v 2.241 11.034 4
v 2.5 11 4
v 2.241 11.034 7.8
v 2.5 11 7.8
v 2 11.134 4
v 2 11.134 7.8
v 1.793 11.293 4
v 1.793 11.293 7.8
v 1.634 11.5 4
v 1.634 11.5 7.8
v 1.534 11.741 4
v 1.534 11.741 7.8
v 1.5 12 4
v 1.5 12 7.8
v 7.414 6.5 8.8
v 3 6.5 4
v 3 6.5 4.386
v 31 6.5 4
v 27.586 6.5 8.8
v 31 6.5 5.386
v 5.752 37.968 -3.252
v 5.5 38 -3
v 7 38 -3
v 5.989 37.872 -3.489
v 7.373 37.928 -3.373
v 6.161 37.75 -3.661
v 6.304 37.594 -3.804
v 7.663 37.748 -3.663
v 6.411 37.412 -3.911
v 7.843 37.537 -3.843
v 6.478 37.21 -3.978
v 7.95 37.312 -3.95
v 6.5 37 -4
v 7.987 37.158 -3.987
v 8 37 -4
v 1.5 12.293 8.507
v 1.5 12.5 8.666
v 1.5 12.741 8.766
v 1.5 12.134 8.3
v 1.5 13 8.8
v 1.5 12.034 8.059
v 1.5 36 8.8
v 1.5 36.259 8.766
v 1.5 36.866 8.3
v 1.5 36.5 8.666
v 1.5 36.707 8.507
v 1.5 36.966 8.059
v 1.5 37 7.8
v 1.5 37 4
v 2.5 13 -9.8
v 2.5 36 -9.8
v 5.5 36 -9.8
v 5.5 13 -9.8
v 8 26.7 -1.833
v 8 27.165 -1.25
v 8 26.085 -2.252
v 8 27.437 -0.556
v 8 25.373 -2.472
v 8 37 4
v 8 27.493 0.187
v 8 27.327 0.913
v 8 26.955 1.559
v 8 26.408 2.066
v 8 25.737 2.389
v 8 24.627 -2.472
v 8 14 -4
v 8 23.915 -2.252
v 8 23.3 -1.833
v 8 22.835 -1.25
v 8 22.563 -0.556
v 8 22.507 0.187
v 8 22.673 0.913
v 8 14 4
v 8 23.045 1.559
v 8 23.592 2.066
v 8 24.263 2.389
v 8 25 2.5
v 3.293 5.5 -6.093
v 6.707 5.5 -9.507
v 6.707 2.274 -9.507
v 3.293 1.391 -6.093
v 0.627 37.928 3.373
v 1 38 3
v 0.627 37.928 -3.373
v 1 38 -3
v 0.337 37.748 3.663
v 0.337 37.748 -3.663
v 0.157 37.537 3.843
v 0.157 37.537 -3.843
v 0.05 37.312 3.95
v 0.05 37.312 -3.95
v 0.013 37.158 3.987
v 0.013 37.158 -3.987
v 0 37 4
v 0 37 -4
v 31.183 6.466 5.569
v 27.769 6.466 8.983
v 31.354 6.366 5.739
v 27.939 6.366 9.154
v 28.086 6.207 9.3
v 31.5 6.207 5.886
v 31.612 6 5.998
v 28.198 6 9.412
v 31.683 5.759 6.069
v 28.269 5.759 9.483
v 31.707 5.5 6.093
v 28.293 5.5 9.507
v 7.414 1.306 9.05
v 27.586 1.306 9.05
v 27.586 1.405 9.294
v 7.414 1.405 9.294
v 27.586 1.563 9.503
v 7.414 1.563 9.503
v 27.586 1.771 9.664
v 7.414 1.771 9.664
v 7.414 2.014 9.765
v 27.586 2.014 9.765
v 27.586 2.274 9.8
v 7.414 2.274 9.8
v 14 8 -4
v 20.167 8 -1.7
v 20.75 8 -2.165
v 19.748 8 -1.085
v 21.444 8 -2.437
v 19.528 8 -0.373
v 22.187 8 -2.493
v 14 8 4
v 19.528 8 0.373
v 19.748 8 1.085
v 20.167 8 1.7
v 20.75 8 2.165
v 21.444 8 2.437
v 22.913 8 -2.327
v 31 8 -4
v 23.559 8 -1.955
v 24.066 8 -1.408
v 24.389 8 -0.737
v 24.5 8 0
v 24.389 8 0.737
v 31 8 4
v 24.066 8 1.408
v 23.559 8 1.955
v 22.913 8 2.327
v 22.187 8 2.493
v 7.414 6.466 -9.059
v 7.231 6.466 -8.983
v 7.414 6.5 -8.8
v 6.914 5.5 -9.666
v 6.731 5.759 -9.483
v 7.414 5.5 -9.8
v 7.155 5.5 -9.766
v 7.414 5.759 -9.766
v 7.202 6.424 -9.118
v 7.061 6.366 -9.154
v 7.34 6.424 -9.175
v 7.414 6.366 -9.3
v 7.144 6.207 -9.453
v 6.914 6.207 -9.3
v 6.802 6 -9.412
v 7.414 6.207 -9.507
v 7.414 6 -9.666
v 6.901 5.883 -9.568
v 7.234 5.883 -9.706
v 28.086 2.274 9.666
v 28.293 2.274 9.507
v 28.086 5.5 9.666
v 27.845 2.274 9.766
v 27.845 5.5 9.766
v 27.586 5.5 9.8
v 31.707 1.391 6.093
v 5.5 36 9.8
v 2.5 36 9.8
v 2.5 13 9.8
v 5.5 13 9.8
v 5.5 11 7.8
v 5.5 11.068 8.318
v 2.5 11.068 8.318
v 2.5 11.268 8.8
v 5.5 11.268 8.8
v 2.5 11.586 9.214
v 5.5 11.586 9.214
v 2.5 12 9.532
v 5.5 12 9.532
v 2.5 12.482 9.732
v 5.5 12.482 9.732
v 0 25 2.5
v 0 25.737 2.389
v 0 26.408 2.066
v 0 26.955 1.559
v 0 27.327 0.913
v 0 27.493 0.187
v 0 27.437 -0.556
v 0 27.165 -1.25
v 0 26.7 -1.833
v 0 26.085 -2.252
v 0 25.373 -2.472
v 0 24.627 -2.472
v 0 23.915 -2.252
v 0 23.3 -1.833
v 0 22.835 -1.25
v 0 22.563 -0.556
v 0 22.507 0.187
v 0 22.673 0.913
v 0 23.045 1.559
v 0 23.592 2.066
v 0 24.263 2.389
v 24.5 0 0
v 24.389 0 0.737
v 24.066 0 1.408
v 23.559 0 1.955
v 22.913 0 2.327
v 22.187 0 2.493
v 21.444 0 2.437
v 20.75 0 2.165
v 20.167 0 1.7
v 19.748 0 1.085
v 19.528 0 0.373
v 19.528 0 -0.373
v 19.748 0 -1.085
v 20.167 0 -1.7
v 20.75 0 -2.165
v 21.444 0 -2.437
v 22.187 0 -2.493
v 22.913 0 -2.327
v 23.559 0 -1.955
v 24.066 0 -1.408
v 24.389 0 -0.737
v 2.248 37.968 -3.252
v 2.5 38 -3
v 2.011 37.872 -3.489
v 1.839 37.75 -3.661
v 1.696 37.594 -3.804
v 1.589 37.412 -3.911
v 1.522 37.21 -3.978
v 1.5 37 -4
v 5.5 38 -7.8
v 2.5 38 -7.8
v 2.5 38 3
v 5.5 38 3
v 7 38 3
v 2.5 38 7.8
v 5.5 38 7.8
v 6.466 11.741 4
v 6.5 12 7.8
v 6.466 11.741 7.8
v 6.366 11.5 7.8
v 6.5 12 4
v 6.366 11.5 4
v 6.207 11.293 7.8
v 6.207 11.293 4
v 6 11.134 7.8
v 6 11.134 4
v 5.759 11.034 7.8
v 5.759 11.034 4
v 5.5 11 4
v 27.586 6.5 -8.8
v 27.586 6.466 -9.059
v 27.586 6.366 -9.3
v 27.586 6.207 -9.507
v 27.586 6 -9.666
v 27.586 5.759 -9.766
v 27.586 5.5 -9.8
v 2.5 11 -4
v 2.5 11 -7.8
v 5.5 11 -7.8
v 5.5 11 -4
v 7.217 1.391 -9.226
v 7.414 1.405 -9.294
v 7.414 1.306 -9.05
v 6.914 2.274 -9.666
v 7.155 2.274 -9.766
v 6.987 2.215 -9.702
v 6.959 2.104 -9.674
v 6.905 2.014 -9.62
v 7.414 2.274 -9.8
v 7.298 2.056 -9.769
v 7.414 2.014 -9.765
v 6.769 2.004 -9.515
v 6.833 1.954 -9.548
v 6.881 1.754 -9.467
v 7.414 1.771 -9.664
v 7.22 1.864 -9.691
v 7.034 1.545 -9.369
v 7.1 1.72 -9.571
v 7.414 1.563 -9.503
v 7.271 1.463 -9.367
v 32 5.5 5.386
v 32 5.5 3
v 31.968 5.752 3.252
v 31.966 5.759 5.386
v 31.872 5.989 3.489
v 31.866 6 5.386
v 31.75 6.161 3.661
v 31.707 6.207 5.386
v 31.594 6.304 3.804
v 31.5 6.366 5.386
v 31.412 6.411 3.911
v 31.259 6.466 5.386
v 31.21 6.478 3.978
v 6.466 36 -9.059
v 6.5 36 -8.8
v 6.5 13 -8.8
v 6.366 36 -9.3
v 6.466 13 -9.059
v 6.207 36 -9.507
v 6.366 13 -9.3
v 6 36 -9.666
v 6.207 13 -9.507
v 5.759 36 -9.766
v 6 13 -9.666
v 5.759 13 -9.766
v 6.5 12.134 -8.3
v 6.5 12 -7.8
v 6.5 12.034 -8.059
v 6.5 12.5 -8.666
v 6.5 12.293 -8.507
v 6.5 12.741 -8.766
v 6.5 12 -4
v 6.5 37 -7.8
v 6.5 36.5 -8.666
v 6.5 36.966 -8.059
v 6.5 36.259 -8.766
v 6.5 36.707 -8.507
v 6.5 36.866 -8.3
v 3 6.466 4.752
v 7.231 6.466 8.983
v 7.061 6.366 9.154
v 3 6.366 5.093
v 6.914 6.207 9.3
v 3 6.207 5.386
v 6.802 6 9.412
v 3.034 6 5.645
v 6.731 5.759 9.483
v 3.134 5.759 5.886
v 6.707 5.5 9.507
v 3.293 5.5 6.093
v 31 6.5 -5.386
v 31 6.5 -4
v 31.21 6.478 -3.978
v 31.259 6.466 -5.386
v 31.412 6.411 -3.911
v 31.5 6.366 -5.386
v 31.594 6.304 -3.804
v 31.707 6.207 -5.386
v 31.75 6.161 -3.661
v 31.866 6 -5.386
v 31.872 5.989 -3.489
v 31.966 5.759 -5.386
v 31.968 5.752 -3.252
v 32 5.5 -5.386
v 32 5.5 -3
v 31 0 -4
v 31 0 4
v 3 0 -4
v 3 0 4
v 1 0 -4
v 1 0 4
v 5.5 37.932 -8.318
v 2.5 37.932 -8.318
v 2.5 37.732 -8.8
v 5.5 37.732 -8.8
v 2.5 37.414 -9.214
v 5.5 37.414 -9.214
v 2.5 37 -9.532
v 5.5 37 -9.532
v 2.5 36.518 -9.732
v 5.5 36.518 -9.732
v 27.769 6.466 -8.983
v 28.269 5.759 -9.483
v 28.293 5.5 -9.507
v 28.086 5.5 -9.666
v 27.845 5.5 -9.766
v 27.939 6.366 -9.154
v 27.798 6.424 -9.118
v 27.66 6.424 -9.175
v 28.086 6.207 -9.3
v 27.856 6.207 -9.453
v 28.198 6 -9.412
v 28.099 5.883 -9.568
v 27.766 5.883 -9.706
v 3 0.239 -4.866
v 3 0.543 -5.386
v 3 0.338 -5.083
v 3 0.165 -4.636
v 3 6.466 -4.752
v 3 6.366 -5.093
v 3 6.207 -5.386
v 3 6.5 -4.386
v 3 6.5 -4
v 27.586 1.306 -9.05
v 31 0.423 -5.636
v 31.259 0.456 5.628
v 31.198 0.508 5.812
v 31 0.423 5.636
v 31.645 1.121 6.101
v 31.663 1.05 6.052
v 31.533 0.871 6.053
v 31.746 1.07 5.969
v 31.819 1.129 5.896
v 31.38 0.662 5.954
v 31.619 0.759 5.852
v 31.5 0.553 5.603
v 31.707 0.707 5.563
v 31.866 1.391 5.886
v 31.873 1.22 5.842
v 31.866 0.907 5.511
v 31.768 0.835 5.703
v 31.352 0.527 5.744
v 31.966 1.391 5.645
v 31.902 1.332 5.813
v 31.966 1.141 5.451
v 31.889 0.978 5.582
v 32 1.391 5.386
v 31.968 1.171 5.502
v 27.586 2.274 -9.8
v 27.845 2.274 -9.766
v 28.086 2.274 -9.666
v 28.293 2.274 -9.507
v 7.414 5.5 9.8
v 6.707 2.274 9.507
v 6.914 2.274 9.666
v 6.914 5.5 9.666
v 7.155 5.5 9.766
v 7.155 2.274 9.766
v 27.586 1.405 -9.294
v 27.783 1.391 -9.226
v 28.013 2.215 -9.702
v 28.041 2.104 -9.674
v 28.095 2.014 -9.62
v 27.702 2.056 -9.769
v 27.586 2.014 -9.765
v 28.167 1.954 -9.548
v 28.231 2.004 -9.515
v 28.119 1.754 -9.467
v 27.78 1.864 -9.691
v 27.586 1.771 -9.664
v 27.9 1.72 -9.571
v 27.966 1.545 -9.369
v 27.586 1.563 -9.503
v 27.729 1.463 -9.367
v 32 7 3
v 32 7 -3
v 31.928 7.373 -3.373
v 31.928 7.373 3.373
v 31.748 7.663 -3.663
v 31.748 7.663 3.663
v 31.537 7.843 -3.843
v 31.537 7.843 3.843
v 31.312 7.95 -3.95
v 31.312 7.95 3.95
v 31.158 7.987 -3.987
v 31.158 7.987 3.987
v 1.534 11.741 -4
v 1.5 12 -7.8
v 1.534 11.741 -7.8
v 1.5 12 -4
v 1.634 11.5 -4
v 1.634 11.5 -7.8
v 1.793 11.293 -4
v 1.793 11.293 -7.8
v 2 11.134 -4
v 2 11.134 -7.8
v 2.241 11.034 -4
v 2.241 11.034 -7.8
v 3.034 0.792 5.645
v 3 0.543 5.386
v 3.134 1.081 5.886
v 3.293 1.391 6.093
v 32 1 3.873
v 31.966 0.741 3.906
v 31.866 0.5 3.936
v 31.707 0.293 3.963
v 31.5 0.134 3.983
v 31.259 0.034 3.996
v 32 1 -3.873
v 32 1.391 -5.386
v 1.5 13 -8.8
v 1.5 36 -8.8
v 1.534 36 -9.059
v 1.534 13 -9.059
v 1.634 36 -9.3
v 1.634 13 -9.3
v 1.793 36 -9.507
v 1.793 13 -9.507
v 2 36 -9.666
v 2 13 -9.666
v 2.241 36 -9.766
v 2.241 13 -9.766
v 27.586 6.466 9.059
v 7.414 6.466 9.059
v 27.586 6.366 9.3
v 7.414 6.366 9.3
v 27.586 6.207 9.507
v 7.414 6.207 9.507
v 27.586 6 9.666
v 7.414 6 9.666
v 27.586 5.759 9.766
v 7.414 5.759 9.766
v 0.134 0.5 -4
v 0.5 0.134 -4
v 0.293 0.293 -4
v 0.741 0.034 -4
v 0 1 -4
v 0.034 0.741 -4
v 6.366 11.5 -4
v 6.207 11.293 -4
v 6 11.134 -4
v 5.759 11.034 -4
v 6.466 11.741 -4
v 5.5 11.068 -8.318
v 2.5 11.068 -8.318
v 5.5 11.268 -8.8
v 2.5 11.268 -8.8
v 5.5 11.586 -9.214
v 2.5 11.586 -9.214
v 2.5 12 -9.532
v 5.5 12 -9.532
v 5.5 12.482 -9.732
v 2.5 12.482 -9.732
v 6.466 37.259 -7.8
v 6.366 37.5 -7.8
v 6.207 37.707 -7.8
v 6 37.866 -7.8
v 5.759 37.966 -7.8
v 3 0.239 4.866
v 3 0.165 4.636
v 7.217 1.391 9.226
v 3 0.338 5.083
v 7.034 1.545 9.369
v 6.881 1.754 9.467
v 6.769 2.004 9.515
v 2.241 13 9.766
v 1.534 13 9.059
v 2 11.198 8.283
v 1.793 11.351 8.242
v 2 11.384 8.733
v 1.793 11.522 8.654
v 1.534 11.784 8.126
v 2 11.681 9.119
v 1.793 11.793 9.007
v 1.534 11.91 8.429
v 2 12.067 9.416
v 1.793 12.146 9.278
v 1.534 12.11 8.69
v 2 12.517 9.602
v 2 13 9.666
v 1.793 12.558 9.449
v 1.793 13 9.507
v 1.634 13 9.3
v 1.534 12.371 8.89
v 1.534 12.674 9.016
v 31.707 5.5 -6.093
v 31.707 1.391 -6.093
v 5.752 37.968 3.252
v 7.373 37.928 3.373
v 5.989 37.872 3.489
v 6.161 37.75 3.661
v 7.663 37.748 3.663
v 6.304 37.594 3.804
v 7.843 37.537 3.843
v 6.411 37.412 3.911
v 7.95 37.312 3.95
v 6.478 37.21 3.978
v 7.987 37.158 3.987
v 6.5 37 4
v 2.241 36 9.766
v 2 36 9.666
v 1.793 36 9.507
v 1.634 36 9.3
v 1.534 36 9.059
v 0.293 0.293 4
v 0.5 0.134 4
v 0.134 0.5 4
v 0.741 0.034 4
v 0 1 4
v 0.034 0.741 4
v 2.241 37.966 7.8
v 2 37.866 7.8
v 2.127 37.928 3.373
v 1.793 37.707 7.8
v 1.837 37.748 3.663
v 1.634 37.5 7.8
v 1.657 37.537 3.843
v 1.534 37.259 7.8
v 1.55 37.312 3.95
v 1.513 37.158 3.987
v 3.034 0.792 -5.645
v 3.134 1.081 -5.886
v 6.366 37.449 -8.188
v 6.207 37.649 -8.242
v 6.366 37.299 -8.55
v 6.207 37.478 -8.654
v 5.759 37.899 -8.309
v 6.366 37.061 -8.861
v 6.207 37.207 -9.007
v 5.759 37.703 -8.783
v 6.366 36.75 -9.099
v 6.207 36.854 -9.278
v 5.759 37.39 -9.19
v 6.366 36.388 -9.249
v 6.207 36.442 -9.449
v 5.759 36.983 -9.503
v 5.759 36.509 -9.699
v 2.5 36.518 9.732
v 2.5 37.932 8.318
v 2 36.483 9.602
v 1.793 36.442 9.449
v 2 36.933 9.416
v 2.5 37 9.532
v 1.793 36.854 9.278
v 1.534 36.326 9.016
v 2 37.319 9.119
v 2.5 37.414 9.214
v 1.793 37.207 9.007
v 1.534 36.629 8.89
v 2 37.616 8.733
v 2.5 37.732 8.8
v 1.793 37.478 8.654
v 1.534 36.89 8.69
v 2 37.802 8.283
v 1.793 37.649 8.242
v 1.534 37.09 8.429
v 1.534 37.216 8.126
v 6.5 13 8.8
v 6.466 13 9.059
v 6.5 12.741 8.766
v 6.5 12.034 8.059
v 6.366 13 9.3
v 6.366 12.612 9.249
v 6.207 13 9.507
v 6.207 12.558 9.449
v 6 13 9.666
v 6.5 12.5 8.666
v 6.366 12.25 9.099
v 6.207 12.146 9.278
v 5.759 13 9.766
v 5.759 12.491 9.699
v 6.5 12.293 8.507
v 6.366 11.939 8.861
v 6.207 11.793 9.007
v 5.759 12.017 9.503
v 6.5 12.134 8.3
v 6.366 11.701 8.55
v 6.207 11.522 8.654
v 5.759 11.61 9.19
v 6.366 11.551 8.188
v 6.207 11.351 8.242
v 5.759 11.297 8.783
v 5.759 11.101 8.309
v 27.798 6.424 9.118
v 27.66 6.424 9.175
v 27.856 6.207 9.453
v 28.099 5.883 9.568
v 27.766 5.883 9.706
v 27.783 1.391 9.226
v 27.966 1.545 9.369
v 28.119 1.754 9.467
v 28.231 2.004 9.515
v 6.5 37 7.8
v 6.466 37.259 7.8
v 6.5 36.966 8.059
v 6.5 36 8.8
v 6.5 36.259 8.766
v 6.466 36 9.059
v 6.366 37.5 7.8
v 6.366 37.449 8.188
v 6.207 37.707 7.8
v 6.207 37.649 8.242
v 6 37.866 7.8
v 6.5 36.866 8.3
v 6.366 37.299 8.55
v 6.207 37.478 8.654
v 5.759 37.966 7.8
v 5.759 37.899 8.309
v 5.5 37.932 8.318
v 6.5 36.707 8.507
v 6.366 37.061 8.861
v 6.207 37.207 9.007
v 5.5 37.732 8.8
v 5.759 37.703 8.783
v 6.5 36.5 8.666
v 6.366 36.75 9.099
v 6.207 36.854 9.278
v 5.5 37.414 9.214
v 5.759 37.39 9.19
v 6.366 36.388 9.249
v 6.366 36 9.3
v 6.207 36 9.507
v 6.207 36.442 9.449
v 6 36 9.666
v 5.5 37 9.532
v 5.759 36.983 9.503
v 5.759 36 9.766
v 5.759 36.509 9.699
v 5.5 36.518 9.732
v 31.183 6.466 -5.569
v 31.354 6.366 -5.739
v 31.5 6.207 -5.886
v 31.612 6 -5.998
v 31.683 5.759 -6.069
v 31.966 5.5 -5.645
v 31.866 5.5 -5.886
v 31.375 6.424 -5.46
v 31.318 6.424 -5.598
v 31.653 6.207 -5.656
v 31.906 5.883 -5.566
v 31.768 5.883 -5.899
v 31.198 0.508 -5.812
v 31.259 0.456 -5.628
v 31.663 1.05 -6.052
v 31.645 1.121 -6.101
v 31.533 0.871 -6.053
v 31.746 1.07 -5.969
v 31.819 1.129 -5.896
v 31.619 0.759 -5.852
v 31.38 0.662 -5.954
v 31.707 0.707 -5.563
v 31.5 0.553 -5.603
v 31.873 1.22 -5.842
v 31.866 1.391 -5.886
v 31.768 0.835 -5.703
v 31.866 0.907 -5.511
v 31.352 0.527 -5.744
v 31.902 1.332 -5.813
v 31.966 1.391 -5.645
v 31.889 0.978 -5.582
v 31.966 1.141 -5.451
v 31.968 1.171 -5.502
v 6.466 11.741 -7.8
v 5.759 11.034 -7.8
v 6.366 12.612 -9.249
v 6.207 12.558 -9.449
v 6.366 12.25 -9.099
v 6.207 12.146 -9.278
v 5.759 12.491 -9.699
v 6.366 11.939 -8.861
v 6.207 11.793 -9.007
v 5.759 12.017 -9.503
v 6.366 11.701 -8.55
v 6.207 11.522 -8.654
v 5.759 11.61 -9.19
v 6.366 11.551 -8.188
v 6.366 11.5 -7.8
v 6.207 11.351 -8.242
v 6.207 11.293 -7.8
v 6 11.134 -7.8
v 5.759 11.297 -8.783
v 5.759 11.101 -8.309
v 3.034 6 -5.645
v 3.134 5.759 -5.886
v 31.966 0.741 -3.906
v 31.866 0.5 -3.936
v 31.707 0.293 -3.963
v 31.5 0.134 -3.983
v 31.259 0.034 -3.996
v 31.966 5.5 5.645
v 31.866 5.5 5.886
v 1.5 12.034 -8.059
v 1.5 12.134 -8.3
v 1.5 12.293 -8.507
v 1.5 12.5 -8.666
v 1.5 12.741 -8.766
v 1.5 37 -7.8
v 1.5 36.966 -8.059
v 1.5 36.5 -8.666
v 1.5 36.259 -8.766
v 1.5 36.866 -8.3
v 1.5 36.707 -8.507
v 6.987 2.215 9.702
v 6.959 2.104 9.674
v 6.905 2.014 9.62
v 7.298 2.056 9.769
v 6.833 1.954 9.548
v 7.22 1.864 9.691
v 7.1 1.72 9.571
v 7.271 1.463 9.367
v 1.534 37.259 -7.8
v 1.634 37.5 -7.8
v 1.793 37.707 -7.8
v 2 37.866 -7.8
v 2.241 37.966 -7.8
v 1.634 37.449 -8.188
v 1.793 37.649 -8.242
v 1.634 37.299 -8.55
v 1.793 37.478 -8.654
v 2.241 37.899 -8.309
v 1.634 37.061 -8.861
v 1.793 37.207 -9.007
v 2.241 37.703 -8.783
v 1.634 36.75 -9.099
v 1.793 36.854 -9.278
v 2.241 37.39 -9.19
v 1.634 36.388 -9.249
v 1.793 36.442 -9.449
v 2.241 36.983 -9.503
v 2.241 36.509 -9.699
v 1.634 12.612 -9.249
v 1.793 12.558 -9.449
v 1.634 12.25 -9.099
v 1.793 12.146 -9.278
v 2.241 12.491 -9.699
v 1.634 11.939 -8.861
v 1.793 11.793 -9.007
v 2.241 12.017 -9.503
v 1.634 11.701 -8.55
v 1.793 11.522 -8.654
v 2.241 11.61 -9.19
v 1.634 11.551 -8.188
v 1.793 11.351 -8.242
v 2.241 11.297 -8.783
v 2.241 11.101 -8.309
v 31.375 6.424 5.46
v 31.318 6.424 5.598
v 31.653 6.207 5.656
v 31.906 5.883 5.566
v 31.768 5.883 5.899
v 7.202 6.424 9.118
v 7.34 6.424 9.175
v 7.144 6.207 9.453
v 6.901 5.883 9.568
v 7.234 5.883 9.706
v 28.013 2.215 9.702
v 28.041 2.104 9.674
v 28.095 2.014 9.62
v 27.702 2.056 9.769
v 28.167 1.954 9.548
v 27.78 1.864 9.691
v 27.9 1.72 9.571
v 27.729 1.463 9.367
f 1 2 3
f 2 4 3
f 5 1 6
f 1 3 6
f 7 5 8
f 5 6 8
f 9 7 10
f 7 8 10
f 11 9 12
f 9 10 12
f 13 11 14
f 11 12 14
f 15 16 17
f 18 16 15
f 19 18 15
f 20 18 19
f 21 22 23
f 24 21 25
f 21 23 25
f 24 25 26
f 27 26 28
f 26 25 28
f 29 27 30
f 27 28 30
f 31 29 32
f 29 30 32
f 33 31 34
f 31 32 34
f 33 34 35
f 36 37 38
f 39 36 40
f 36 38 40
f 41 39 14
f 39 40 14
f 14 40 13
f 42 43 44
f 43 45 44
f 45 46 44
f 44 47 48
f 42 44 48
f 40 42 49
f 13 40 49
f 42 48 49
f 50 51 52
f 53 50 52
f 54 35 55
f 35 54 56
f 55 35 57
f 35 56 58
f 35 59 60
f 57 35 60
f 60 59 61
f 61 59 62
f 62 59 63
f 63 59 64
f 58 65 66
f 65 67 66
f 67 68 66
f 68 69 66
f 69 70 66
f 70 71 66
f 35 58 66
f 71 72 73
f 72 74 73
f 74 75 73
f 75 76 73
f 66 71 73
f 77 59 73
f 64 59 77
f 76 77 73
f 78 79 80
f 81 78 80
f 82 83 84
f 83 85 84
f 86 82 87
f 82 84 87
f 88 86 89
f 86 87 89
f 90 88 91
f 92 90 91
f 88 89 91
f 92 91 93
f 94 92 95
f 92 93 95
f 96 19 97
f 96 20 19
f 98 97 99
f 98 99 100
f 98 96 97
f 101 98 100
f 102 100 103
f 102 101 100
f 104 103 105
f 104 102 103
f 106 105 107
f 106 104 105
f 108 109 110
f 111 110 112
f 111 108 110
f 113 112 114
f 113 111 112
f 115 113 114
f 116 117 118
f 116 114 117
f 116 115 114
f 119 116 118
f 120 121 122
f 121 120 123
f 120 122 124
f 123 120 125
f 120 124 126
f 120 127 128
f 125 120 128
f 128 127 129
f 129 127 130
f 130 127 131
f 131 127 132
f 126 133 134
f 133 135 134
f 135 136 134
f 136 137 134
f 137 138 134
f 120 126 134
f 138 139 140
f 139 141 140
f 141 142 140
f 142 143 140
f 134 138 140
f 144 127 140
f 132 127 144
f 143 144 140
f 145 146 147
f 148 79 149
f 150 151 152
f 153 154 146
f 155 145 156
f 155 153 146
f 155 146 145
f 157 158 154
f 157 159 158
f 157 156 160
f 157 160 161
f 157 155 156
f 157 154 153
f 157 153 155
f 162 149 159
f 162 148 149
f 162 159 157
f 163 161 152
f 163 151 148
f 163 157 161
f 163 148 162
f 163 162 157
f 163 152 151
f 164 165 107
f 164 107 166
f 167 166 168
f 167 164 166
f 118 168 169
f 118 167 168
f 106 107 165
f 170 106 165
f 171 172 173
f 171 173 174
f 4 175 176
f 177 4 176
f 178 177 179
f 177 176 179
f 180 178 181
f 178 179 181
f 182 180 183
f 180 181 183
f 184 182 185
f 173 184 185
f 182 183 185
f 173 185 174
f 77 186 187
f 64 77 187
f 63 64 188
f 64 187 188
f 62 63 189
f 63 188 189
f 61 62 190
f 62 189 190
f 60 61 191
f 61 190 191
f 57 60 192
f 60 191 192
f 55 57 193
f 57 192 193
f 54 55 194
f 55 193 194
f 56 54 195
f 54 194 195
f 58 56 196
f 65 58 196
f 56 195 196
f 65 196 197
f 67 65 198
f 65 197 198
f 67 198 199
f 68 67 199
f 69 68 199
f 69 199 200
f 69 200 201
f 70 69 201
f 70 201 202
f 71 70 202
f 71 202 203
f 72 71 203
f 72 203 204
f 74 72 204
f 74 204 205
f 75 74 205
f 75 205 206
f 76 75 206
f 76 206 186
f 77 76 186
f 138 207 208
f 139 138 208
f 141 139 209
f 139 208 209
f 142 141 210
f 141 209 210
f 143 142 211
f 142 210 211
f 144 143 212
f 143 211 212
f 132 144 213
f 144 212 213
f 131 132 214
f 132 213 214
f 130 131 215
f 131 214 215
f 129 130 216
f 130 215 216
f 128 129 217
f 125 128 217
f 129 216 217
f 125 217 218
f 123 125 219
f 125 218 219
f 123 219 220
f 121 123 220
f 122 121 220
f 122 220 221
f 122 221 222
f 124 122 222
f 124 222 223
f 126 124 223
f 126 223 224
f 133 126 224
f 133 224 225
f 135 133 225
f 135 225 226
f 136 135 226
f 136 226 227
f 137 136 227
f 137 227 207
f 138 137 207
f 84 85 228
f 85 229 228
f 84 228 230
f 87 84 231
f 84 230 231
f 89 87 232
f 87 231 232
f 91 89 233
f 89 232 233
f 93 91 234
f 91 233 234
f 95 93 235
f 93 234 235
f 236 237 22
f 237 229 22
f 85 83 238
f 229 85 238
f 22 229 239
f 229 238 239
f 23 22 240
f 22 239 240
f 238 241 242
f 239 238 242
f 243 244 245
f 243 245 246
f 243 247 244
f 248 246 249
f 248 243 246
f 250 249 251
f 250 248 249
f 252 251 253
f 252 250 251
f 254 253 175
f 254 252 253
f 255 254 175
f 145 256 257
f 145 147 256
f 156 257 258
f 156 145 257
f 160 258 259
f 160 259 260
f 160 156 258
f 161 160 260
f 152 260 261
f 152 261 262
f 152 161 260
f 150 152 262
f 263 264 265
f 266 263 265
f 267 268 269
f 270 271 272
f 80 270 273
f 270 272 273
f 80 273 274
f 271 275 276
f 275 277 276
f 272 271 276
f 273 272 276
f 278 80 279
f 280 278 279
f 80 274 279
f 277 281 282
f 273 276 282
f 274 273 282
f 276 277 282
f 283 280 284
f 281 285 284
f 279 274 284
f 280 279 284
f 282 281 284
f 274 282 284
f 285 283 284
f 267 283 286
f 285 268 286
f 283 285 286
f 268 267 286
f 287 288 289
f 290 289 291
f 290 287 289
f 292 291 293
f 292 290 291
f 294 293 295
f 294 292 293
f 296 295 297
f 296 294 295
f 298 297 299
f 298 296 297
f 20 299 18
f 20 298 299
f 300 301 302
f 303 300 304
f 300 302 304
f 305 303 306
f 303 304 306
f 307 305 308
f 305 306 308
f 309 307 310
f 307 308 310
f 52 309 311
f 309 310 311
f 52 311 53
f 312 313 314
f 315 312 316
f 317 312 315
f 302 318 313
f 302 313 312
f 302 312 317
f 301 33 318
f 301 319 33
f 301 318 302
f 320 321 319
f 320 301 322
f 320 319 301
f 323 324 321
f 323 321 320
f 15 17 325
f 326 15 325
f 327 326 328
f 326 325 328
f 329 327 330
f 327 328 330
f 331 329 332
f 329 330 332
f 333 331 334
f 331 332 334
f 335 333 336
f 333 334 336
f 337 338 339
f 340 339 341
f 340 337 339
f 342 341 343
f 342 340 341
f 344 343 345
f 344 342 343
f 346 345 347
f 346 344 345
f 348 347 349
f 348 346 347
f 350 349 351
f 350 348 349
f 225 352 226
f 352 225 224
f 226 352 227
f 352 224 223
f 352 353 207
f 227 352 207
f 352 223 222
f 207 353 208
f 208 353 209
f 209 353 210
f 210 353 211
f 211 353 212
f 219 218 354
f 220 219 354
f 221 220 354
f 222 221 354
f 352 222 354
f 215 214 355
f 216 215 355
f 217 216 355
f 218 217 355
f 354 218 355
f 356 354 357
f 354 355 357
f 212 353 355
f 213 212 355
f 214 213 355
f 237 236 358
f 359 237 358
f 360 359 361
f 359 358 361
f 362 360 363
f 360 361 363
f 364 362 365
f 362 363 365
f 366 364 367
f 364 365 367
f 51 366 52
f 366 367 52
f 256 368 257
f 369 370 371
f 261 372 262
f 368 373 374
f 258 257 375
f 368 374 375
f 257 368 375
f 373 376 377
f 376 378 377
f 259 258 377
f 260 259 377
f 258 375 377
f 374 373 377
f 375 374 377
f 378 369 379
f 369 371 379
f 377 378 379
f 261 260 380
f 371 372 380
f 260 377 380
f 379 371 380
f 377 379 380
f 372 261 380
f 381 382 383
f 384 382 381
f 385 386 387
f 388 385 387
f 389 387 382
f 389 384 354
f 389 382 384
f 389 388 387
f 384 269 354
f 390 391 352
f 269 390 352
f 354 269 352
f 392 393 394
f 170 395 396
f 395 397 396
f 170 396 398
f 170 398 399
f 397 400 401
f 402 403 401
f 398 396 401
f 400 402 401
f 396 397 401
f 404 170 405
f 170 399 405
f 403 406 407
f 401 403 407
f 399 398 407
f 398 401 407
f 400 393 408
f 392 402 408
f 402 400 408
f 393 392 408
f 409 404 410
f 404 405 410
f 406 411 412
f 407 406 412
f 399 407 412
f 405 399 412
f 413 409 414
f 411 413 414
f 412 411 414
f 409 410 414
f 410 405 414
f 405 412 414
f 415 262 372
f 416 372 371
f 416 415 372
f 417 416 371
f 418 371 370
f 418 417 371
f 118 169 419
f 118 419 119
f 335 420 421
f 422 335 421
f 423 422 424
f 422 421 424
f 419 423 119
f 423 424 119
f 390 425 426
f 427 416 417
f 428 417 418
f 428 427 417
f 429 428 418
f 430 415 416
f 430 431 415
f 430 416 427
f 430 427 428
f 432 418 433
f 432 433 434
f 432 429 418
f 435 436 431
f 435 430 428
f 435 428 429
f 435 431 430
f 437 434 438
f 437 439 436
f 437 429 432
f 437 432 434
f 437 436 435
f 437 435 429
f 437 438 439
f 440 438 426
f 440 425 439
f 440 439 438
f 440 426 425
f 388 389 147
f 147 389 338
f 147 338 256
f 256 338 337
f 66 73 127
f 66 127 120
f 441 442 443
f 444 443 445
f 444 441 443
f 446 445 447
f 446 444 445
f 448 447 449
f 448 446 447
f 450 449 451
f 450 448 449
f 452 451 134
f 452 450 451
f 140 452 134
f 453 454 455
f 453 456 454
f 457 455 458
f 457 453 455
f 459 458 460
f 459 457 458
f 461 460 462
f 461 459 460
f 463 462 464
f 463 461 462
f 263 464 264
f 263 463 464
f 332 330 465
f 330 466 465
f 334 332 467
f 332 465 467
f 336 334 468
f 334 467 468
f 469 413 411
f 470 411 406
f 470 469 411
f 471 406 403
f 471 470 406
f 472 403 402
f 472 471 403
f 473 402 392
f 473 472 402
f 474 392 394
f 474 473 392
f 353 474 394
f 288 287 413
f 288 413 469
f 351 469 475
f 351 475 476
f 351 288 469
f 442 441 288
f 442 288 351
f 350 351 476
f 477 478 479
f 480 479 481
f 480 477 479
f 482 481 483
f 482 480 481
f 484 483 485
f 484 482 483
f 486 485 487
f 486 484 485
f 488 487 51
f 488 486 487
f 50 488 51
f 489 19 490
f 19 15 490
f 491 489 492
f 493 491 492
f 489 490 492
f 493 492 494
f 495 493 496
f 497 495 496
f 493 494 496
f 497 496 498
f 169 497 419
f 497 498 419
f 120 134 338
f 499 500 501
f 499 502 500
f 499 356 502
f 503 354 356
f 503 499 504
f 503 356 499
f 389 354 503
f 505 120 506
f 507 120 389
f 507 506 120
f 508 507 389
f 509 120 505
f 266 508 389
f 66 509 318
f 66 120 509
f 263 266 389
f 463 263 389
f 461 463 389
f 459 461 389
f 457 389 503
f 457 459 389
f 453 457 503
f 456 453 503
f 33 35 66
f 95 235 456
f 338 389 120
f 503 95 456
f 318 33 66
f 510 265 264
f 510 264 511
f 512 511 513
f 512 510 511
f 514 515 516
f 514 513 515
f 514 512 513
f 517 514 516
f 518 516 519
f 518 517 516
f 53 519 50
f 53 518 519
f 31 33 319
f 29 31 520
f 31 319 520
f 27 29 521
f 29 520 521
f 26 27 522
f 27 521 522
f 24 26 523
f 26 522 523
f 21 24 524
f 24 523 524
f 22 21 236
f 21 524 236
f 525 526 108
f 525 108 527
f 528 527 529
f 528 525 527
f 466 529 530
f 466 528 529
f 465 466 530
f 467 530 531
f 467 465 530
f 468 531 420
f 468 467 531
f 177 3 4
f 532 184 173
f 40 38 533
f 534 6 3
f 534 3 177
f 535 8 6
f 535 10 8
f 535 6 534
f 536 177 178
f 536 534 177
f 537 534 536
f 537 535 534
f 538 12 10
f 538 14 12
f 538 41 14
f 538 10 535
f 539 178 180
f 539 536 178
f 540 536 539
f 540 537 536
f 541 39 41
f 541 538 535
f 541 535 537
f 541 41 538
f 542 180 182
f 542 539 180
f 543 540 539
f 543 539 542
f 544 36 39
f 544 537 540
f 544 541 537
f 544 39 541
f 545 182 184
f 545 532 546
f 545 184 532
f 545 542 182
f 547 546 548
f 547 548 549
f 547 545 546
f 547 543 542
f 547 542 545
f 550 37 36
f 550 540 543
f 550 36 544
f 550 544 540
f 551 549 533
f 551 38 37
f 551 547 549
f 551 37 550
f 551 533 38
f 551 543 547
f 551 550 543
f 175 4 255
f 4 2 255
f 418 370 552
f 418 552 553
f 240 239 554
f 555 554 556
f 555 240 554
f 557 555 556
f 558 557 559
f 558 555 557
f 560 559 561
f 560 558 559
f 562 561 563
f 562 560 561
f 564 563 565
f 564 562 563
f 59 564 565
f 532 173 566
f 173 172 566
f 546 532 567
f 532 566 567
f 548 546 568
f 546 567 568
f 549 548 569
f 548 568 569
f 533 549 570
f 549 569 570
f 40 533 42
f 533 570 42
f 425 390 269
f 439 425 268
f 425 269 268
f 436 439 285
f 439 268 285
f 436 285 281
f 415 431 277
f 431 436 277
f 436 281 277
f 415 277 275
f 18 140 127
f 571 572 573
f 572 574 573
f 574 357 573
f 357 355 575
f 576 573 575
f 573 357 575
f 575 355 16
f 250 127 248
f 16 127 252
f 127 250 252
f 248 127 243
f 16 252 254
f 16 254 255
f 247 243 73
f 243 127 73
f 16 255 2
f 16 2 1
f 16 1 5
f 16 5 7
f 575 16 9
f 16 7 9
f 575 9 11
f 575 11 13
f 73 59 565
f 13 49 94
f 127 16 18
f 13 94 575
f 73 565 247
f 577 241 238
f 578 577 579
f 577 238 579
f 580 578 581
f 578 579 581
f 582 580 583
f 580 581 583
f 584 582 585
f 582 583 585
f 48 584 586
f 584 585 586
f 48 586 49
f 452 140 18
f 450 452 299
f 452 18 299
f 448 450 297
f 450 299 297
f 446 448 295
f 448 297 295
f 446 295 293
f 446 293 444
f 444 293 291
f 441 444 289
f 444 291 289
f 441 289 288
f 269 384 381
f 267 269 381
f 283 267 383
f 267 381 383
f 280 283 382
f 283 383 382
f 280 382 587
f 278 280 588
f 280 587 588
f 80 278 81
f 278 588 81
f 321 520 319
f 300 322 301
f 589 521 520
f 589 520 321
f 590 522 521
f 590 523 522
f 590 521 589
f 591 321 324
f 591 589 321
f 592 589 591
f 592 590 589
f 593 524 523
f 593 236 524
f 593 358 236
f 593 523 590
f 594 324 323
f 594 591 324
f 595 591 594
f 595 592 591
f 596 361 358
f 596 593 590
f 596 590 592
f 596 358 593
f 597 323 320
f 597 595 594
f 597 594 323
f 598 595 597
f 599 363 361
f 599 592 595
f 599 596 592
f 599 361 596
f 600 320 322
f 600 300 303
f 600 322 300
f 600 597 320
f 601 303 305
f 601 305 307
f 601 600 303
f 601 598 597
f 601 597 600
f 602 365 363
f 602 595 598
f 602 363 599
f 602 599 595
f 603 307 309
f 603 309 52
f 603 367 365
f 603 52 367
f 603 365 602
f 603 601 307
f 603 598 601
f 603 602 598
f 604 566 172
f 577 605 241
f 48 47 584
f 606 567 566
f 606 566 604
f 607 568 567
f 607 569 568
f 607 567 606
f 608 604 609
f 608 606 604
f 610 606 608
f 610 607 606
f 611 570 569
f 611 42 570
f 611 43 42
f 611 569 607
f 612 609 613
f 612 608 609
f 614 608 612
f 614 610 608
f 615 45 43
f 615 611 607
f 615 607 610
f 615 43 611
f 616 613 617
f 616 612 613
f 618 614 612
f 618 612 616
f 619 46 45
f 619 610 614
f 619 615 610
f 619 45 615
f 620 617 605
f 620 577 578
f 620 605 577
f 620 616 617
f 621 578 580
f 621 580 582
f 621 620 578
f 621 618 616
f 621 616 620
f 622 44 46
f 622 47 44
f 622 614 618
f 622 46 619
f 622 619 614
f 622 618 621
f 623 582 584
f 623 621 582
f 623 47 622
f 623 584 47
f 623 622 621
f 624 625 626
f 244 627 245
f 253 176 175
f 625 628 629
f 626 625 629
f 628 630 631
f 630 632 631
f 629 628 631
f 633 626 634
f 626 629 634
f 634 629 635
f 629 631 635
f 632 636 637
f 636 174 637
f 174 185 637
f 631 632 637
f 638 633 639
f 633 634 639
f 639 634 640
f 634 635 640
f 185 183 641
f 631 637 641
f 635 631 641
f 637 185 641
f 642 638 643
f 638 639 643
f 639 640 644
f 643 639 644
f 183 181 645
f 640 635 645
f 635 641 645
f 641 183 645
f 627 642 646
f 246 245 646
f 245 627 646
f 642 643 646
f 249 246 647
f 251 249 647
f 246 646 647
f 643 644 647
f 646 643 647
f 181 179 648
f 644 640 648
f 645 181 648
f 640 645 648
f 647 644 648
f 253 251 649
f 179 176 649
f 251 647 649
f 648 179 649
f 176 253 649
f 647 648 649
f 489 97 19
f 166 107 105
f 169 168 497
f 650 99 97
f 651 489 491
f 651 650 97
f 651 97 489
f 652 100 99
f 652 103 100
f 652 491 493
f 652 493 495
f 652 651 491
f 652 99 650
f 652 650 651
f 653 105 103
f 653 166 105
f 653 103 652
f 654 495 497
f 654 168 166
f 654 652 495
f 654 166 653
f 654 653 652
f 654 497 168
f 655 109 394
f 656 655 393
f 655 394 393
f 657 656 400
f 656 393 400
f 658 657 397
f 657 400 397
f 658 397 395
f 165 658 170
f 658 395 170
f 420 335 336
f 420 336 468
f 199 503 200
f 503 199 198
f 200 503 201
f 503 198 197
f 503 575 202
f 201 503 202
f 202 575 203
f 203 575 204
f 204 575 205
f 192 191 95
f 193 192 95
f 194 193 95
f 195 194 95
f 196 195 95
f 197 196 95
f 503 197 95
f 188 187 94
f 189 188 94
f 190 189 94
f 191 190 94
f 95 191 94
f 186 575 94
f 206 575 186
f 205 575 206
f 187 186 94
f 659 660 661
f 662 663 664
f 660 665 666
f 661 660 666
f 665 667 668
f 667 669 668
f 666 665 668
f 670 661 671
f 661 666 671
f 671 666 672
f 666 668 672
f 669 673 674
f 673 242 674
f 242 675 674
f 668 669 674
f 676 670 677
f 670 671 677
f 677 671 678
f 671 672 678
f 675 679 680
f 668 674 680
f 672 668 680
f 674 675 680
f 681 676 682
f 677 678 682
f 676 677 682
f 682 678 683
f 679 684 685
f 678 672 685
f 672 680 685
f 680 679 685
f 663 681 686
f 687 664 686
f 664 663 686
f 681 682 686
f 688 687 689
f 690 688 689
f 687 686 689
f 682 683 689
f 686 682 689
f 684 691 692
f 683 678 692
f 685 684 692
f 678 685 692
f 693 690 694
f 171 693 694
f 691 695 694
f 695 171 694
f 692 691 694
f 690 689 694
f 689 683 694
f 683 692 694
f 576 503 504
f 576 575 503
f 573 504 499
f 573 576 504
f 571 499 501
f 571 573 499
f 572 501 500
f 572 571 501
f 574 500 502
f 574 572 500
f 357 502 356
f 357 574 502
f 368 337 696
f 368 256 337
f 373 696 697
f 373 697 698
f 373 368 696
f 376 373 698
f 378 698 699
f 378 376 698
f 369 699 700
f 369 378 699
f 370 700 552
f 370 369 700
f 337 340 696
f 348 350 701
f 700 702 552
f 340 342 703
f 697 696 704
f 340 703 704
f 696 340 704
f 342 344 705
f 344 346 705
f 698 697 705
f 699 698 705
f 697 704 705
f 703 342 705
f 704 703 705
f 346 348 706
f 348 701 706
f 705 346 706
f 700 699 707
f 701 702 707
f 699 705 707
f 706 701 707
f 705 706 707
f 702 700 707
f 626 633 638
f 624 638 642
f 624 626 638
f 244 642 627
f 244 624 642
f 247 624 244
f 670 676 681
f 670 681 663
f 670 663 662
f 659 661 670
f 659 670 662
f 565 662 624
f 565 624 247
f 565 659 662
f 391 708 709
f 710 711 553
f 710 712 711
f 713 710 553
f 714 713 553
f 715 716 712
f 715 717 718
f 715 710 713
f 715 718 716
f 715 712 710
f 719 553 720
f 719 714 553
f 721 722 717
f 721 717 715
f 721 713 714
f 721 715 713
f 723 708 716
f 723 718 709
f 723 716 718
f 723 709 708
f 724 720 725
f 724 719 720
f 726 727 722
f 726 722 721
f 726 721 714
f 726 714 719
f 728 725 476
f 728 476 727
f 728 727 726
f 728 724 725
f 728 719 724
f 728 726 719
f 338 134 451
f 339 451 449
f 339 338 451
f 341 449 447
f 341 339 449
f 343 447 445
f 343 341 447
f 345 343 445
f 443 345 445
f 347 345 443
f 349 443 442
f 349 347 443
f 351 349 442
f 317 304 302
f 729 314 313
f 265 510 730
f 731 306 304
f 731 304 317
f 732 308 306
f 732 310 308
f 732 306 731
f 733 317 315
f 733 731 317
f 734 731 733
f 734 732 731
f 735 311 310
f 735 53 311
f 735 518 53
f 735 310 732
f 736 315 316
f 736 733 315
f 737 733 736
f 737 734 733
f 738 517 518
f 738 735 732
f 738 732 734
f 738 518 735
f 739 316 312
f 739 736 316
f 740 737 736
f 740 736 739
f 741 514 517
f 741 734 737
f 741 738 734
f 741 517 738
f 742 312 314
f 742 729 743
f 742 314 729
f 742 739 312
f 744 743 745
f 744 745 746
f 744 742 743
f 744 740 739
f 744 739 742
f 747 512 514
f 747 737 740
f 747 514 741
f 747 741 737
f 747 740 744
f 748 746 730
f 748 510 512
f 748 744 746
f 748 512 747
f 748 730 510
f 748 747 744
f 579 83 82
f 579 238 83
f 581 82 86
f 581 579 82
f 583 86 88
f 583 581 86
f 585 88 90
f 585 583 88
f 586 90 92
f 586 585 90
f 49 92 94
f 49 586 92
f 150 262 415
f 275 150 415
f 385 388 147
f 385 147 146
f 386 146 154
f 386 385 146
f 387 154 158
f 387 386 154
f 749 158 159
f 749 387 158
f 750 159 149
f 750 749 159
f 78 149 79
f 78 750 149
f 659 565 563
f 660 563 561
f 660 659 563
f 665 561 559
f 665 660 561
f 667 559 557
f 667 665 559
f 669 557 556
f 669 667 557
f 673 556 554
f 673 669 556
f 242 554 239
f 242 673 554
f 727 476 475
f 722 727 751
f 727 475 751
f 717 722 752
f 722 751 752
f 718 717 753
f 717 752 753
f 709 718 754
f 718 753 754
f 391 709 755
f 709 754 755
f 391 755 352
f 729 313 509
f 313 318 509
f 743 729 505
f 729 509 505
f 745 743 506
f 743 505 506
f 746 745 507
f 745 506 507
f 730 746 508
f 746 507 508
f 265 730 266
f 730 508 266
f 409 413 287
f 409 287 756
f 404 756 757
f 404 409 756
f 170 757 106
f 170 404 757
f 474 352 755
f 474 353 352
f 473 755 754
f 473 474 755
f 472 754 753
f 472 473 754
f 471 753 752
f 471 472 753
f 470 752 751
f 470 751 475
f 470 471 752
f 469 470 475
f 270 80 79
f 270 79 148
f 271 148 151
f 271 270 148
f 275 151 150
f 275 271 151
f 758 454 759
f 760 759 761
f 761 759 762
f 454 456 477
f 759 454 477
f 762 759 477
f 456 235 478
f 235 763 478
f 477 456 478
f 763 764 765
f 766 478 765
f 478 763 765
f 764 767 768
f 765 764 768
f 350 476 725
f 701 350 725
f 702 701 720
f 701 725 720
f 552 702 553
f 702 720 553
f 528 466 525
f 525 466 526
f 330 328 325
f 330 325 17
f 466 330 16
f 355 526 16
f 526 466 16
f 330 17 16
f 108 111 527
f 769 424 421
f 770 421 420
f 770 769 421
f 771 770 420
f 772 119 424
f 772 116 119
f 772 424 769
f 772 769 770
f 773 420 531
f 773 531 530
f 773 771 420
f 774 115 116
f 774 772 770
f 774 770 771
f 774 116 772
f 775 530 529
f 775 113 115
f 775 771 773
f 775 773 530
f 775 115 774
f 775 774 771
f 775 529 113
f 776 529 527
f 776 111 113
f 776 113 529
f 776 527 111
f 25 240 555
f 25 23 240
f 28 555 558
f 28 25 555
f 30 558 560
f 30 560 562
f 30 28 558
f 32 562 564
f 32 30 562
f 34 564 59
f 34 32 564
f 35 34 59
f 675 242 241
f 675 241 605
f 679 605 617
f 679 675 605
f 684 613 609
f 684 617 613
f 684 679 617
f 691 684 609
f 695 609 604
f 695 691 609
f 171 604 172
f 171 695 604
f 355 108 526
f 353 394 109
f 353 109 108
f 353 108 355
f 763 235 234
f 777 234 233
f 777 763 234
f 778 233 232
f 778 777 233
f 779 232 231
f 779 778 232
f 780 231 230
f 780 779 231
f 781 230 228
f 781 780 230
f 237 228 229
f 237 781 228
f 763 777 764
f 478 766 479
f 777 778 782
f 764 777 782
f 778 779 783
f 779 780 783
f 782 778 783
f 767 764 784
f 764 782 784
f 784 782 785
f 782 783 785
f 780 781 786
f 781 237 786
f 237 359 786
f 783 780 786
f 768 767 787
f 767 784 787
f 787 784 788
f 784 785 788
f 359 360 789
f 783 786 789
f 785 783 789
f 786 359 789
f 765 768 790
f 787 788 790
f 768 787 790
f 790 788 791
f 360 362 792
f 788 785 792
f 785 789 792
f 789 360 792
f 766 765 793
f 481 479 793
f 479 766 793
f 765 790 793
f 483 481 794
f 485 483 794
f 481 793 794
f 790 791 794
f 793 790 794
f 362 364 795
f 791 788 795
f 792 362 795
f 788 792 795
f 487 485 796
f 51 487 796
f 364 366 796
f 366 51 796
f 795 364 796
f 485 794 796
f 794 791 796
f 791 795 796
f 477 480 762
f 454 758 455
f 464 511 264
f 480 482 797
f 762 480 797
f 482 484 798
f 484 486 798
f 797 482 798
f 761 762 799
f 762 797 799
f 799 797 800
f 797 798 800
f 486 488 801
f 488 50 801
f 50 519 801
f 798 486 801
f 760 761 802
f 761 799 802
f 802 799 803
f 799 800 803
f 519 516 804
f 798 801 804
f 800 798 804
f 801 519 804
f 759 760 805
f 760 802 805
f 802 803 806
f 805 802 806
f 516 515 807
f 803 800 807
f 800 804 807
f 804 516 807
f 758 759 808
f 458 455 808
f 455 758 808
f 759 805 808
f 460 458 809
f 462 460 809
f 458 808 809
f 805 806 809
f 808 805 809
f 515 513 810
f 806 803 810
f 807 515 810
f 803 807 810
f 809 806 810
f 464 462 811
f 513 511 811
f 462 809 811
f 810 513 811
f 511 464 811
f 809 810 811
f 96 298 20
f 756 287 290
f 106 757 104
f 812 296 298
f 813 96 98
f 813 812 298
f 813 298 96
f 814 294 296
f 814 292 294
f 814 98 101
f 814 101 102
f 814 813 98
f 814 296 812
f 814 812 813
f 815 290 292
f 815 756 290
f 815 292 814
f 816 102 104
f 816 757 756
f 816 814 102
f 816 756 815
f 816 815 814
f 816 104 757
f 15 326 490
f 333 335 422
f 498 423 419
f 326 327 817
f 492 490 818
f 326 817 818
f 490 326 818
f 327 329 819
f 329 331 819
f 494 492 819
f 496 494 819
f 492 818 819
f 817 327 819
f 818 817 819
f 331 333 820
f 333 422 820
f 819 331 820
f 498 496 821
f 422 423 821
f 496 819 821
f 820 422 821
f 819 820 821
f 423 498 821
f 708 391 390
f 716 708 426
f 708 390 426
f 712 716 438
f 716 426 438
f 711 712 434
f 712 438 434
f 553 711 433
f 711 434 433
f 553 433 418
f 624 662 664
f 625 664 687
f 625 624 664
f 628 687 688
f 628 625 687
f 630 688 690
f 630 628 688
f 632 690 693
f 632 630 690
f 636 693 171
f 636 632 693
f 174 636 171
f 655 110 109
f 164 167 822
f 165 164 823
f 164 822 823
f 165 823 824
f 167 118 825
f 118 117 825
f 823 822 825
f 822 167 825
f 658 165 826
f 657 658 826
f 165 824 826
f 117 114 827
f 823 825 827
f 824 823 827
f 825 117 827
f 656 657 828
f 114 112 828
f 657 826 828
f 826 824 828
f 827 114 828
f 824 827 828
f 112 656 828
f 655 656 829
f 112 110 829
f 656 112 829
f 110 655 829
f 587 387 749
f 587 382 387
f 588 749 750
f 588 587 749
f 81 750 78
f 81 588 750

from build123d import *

# Parameters (mm, degrees)
BOSS_EXTRUDE1_DEPTH = 4
BOSS_EXTRUDE2_DEPTH = 29
CHAMFER1_SIZE       = 4
CHAMFER2_SIZE       = 6
CUT_EXTRUDE1_REACH  = 40
SKETCH3_R           = 2.5
CUT_EXTRUDE2_REACH  = 34
SKETCH4_R           = 2.5
SKETCH5_W           = 5
SKETCH5_H           = 5.8
BOSS_EXTRUDE3_DEPTH = 27
FILLET1_R           = 2
FILLET2_R           = 1


with BuildPart() as part:
    # Sketch1 → Boss-Extrude1 (new body, symmetric)
    with BuildSketch(Plane.XY):
        Polygon((0, 0), (0, 38), (8, 38), (8, 8), (32, 8), (32, 0), align=None)
    extrude(amount=BOSS_EXTRUDE1_DEPTH, both=True)

    # Sketch2 → Boss-Extrude2 (add)
    with BuildSketch(Plane(origin=(32, 0, 0), x_dir=(0, 0, -1), z_dir=(1, 0, 0))):
        Polygon((-4, 6.5), (-9.8, 6.5), (-9.8, 1.5), (-4, 0), align=None)
        Polygon((4, 0), (4, 6.5), (9.8, 6.5), (9.8, 1.5), align=None)
    extrude(amount=-BOSS_EXTRUDE2_DEPTH)

    # Chamfer1
    chamfer1_edges = [part.edges().sort_by_distance(p)[0] for p in [
        (3, 4, 9.8),
        (32, 4, 9.8),
        (3, 4, -9.8),
        (32, 4, -9.8),
    ]]
    chamfer(chamfer1_edges, length=CHAMFER1_SIZE)

    # Chamfer2
    chamfer2_edges = [part.edges().sort_by_distance(p)[0] for p in [
        (8, 8, 0),
    ]]
    chamfer(chamfer2_edges, length=CHAMFER2_SIZE)

    # Sketch3 → Cut-Extrude1 (cut, up to next)
    with BuildSketch(Plane.XZ, mode=Mode.PRIVATE) as cut_extrude1_sk1:
        with Locations((22, 0)):
            Circle(SKETCH3_R)
    cut_extrude1_tool1 = extrude(cut_extrude1_sk1.sketch, amount=-CUT_EXTRUDE1_REACH, mode=Mode.PRIVATE) & part.part
    add(cut_extrude1_tool1.solids().sort_by_distance((22, 0, 0))[0], mode=Mode.SUBTRACT)

    # Sketch4 → Cut-Extrude2 (cut, up to next)
    with BuildSketch(Plane.ZY, mode=Mode.PRIVATE) as cut_extrude2_sk1:
        with Locations((0, 25)):
            Circle(SKETCH4_R)
    cut_extrude2_tool1 = extrude(cut_extrude2_sk1.sketch, amount=-CUT_EXTRUDE2_REACH, mode=Mode.PRIVATE) & part.part
    add(cut_extrude2_tool1.solids().sort_by_distance((0, 25, 0))[0], mode=Mode.SUBTRACT)

    # Sketch5 → Boss-Extrude3 (add)
    with BuildSketch(Plane(origin=(0, 38, 0), x_dir=(1, 0, 0), z_dir=(0, 1, 0))):
        with Locations((4, 6.9)):
            Rectangle(SKETCH5_W, SKETCH5_H)
        with Locations((4, -6.9)):
            Rectangle(SKETCH5_W, SKETCH5_H)
    extrude(amount=-BOSS_EXTRUDE3_DEPTH)

    # Fillet1
    fillet1_edges = [part.edges().sort_by_distance(p)[0] for p in [
        (4, 38, 9.8),
        (4, 11, -9.8),
        (4, 38, -9.8),
        (4, 11, 9.8),
    ]]
    fillet(fillet1_edges, radius=FILLET1_R)

    # Fillet2
    fillet2_edges = [part.edges().sort_by_distance(p)[0] for p in [
        (1.5, 38, 5.9),
        (6.5, 24.5, -9.8),
        (0, 0, 0),
        (1.5, 24.5, -9.8),
        (0, 38, 0),
        (1.5, 38, -5.9),
        (8, 38, 0),
        (1.5, 11, -5.9),
        (1.5, 37.414213562, -9.214213562),
        (1.5, 11.585786438, -9.214213562),
        (32, 8, 0),
        (6.5, 37.414213562, -9.214213562),
        (6.5, 11.585786438, -9.214213562),
        (32, 0, 0),
        (1.5, 24.5, 9.8),
        (6.5, 24.5, 9.8),
        (6.5, 38, 5.9),
        (6.5, 11, 5.9),
        (6.5, 37.414213562, 9.214213562),
        (6.5, 11.585786438, 9.214213562),
        (1.5, 37.414213562, 9.214213562),
        (1.5, 11.585786438, 9.214213562),
        (32, 7.25, 4),
        (7.25, 38, 4),
        (32, 6.5, 4.9),
        (32, 7.25, -4),
        (32, 0.232758621, -4.9),
        (17.5, 1.5, -9.8),
        (17.5, 6.5, -9.8),
        (28, 4, -9.8),
        (7, 4, -9.8),
        (32, 6.5, -4.9),
        (30, 6.5, -7.8),
        (5, 6.5, -7.8),
        (3, 3.482758621, -5.8),
        (30, 0.982758621, -7.8),
        (5, 0.982758621, -7.8),
        (17.5, 6.5, 9.8),
        (17.5, 1.5, 9.8),
        (28, 4, 9.8),
        (7, 4, 9.8),
        (32, 0.232758621, 4.9),
        (30, 0.982758621, 7.8),
        (5, 0.982758621, 7.8),
        (3, 3.482758621, 5.8),
        (30, 6.5, 7.8),
        (5, 6.5, 7.8),
        (32, 3.482758621, 5.8),
        (32, 3.482758621, -5.8),
        (7.25, 38, -4),
        (0.75, 38, -4),
        (6.5, 11, -5.9),
        (6.5, 38, -5.9),
        (0.75, 38, 4),
        (1.5, 11, 5.9),
    ]]
    fillet(fillet2_edges, radius=FILLET2_R)


solid = part.part
